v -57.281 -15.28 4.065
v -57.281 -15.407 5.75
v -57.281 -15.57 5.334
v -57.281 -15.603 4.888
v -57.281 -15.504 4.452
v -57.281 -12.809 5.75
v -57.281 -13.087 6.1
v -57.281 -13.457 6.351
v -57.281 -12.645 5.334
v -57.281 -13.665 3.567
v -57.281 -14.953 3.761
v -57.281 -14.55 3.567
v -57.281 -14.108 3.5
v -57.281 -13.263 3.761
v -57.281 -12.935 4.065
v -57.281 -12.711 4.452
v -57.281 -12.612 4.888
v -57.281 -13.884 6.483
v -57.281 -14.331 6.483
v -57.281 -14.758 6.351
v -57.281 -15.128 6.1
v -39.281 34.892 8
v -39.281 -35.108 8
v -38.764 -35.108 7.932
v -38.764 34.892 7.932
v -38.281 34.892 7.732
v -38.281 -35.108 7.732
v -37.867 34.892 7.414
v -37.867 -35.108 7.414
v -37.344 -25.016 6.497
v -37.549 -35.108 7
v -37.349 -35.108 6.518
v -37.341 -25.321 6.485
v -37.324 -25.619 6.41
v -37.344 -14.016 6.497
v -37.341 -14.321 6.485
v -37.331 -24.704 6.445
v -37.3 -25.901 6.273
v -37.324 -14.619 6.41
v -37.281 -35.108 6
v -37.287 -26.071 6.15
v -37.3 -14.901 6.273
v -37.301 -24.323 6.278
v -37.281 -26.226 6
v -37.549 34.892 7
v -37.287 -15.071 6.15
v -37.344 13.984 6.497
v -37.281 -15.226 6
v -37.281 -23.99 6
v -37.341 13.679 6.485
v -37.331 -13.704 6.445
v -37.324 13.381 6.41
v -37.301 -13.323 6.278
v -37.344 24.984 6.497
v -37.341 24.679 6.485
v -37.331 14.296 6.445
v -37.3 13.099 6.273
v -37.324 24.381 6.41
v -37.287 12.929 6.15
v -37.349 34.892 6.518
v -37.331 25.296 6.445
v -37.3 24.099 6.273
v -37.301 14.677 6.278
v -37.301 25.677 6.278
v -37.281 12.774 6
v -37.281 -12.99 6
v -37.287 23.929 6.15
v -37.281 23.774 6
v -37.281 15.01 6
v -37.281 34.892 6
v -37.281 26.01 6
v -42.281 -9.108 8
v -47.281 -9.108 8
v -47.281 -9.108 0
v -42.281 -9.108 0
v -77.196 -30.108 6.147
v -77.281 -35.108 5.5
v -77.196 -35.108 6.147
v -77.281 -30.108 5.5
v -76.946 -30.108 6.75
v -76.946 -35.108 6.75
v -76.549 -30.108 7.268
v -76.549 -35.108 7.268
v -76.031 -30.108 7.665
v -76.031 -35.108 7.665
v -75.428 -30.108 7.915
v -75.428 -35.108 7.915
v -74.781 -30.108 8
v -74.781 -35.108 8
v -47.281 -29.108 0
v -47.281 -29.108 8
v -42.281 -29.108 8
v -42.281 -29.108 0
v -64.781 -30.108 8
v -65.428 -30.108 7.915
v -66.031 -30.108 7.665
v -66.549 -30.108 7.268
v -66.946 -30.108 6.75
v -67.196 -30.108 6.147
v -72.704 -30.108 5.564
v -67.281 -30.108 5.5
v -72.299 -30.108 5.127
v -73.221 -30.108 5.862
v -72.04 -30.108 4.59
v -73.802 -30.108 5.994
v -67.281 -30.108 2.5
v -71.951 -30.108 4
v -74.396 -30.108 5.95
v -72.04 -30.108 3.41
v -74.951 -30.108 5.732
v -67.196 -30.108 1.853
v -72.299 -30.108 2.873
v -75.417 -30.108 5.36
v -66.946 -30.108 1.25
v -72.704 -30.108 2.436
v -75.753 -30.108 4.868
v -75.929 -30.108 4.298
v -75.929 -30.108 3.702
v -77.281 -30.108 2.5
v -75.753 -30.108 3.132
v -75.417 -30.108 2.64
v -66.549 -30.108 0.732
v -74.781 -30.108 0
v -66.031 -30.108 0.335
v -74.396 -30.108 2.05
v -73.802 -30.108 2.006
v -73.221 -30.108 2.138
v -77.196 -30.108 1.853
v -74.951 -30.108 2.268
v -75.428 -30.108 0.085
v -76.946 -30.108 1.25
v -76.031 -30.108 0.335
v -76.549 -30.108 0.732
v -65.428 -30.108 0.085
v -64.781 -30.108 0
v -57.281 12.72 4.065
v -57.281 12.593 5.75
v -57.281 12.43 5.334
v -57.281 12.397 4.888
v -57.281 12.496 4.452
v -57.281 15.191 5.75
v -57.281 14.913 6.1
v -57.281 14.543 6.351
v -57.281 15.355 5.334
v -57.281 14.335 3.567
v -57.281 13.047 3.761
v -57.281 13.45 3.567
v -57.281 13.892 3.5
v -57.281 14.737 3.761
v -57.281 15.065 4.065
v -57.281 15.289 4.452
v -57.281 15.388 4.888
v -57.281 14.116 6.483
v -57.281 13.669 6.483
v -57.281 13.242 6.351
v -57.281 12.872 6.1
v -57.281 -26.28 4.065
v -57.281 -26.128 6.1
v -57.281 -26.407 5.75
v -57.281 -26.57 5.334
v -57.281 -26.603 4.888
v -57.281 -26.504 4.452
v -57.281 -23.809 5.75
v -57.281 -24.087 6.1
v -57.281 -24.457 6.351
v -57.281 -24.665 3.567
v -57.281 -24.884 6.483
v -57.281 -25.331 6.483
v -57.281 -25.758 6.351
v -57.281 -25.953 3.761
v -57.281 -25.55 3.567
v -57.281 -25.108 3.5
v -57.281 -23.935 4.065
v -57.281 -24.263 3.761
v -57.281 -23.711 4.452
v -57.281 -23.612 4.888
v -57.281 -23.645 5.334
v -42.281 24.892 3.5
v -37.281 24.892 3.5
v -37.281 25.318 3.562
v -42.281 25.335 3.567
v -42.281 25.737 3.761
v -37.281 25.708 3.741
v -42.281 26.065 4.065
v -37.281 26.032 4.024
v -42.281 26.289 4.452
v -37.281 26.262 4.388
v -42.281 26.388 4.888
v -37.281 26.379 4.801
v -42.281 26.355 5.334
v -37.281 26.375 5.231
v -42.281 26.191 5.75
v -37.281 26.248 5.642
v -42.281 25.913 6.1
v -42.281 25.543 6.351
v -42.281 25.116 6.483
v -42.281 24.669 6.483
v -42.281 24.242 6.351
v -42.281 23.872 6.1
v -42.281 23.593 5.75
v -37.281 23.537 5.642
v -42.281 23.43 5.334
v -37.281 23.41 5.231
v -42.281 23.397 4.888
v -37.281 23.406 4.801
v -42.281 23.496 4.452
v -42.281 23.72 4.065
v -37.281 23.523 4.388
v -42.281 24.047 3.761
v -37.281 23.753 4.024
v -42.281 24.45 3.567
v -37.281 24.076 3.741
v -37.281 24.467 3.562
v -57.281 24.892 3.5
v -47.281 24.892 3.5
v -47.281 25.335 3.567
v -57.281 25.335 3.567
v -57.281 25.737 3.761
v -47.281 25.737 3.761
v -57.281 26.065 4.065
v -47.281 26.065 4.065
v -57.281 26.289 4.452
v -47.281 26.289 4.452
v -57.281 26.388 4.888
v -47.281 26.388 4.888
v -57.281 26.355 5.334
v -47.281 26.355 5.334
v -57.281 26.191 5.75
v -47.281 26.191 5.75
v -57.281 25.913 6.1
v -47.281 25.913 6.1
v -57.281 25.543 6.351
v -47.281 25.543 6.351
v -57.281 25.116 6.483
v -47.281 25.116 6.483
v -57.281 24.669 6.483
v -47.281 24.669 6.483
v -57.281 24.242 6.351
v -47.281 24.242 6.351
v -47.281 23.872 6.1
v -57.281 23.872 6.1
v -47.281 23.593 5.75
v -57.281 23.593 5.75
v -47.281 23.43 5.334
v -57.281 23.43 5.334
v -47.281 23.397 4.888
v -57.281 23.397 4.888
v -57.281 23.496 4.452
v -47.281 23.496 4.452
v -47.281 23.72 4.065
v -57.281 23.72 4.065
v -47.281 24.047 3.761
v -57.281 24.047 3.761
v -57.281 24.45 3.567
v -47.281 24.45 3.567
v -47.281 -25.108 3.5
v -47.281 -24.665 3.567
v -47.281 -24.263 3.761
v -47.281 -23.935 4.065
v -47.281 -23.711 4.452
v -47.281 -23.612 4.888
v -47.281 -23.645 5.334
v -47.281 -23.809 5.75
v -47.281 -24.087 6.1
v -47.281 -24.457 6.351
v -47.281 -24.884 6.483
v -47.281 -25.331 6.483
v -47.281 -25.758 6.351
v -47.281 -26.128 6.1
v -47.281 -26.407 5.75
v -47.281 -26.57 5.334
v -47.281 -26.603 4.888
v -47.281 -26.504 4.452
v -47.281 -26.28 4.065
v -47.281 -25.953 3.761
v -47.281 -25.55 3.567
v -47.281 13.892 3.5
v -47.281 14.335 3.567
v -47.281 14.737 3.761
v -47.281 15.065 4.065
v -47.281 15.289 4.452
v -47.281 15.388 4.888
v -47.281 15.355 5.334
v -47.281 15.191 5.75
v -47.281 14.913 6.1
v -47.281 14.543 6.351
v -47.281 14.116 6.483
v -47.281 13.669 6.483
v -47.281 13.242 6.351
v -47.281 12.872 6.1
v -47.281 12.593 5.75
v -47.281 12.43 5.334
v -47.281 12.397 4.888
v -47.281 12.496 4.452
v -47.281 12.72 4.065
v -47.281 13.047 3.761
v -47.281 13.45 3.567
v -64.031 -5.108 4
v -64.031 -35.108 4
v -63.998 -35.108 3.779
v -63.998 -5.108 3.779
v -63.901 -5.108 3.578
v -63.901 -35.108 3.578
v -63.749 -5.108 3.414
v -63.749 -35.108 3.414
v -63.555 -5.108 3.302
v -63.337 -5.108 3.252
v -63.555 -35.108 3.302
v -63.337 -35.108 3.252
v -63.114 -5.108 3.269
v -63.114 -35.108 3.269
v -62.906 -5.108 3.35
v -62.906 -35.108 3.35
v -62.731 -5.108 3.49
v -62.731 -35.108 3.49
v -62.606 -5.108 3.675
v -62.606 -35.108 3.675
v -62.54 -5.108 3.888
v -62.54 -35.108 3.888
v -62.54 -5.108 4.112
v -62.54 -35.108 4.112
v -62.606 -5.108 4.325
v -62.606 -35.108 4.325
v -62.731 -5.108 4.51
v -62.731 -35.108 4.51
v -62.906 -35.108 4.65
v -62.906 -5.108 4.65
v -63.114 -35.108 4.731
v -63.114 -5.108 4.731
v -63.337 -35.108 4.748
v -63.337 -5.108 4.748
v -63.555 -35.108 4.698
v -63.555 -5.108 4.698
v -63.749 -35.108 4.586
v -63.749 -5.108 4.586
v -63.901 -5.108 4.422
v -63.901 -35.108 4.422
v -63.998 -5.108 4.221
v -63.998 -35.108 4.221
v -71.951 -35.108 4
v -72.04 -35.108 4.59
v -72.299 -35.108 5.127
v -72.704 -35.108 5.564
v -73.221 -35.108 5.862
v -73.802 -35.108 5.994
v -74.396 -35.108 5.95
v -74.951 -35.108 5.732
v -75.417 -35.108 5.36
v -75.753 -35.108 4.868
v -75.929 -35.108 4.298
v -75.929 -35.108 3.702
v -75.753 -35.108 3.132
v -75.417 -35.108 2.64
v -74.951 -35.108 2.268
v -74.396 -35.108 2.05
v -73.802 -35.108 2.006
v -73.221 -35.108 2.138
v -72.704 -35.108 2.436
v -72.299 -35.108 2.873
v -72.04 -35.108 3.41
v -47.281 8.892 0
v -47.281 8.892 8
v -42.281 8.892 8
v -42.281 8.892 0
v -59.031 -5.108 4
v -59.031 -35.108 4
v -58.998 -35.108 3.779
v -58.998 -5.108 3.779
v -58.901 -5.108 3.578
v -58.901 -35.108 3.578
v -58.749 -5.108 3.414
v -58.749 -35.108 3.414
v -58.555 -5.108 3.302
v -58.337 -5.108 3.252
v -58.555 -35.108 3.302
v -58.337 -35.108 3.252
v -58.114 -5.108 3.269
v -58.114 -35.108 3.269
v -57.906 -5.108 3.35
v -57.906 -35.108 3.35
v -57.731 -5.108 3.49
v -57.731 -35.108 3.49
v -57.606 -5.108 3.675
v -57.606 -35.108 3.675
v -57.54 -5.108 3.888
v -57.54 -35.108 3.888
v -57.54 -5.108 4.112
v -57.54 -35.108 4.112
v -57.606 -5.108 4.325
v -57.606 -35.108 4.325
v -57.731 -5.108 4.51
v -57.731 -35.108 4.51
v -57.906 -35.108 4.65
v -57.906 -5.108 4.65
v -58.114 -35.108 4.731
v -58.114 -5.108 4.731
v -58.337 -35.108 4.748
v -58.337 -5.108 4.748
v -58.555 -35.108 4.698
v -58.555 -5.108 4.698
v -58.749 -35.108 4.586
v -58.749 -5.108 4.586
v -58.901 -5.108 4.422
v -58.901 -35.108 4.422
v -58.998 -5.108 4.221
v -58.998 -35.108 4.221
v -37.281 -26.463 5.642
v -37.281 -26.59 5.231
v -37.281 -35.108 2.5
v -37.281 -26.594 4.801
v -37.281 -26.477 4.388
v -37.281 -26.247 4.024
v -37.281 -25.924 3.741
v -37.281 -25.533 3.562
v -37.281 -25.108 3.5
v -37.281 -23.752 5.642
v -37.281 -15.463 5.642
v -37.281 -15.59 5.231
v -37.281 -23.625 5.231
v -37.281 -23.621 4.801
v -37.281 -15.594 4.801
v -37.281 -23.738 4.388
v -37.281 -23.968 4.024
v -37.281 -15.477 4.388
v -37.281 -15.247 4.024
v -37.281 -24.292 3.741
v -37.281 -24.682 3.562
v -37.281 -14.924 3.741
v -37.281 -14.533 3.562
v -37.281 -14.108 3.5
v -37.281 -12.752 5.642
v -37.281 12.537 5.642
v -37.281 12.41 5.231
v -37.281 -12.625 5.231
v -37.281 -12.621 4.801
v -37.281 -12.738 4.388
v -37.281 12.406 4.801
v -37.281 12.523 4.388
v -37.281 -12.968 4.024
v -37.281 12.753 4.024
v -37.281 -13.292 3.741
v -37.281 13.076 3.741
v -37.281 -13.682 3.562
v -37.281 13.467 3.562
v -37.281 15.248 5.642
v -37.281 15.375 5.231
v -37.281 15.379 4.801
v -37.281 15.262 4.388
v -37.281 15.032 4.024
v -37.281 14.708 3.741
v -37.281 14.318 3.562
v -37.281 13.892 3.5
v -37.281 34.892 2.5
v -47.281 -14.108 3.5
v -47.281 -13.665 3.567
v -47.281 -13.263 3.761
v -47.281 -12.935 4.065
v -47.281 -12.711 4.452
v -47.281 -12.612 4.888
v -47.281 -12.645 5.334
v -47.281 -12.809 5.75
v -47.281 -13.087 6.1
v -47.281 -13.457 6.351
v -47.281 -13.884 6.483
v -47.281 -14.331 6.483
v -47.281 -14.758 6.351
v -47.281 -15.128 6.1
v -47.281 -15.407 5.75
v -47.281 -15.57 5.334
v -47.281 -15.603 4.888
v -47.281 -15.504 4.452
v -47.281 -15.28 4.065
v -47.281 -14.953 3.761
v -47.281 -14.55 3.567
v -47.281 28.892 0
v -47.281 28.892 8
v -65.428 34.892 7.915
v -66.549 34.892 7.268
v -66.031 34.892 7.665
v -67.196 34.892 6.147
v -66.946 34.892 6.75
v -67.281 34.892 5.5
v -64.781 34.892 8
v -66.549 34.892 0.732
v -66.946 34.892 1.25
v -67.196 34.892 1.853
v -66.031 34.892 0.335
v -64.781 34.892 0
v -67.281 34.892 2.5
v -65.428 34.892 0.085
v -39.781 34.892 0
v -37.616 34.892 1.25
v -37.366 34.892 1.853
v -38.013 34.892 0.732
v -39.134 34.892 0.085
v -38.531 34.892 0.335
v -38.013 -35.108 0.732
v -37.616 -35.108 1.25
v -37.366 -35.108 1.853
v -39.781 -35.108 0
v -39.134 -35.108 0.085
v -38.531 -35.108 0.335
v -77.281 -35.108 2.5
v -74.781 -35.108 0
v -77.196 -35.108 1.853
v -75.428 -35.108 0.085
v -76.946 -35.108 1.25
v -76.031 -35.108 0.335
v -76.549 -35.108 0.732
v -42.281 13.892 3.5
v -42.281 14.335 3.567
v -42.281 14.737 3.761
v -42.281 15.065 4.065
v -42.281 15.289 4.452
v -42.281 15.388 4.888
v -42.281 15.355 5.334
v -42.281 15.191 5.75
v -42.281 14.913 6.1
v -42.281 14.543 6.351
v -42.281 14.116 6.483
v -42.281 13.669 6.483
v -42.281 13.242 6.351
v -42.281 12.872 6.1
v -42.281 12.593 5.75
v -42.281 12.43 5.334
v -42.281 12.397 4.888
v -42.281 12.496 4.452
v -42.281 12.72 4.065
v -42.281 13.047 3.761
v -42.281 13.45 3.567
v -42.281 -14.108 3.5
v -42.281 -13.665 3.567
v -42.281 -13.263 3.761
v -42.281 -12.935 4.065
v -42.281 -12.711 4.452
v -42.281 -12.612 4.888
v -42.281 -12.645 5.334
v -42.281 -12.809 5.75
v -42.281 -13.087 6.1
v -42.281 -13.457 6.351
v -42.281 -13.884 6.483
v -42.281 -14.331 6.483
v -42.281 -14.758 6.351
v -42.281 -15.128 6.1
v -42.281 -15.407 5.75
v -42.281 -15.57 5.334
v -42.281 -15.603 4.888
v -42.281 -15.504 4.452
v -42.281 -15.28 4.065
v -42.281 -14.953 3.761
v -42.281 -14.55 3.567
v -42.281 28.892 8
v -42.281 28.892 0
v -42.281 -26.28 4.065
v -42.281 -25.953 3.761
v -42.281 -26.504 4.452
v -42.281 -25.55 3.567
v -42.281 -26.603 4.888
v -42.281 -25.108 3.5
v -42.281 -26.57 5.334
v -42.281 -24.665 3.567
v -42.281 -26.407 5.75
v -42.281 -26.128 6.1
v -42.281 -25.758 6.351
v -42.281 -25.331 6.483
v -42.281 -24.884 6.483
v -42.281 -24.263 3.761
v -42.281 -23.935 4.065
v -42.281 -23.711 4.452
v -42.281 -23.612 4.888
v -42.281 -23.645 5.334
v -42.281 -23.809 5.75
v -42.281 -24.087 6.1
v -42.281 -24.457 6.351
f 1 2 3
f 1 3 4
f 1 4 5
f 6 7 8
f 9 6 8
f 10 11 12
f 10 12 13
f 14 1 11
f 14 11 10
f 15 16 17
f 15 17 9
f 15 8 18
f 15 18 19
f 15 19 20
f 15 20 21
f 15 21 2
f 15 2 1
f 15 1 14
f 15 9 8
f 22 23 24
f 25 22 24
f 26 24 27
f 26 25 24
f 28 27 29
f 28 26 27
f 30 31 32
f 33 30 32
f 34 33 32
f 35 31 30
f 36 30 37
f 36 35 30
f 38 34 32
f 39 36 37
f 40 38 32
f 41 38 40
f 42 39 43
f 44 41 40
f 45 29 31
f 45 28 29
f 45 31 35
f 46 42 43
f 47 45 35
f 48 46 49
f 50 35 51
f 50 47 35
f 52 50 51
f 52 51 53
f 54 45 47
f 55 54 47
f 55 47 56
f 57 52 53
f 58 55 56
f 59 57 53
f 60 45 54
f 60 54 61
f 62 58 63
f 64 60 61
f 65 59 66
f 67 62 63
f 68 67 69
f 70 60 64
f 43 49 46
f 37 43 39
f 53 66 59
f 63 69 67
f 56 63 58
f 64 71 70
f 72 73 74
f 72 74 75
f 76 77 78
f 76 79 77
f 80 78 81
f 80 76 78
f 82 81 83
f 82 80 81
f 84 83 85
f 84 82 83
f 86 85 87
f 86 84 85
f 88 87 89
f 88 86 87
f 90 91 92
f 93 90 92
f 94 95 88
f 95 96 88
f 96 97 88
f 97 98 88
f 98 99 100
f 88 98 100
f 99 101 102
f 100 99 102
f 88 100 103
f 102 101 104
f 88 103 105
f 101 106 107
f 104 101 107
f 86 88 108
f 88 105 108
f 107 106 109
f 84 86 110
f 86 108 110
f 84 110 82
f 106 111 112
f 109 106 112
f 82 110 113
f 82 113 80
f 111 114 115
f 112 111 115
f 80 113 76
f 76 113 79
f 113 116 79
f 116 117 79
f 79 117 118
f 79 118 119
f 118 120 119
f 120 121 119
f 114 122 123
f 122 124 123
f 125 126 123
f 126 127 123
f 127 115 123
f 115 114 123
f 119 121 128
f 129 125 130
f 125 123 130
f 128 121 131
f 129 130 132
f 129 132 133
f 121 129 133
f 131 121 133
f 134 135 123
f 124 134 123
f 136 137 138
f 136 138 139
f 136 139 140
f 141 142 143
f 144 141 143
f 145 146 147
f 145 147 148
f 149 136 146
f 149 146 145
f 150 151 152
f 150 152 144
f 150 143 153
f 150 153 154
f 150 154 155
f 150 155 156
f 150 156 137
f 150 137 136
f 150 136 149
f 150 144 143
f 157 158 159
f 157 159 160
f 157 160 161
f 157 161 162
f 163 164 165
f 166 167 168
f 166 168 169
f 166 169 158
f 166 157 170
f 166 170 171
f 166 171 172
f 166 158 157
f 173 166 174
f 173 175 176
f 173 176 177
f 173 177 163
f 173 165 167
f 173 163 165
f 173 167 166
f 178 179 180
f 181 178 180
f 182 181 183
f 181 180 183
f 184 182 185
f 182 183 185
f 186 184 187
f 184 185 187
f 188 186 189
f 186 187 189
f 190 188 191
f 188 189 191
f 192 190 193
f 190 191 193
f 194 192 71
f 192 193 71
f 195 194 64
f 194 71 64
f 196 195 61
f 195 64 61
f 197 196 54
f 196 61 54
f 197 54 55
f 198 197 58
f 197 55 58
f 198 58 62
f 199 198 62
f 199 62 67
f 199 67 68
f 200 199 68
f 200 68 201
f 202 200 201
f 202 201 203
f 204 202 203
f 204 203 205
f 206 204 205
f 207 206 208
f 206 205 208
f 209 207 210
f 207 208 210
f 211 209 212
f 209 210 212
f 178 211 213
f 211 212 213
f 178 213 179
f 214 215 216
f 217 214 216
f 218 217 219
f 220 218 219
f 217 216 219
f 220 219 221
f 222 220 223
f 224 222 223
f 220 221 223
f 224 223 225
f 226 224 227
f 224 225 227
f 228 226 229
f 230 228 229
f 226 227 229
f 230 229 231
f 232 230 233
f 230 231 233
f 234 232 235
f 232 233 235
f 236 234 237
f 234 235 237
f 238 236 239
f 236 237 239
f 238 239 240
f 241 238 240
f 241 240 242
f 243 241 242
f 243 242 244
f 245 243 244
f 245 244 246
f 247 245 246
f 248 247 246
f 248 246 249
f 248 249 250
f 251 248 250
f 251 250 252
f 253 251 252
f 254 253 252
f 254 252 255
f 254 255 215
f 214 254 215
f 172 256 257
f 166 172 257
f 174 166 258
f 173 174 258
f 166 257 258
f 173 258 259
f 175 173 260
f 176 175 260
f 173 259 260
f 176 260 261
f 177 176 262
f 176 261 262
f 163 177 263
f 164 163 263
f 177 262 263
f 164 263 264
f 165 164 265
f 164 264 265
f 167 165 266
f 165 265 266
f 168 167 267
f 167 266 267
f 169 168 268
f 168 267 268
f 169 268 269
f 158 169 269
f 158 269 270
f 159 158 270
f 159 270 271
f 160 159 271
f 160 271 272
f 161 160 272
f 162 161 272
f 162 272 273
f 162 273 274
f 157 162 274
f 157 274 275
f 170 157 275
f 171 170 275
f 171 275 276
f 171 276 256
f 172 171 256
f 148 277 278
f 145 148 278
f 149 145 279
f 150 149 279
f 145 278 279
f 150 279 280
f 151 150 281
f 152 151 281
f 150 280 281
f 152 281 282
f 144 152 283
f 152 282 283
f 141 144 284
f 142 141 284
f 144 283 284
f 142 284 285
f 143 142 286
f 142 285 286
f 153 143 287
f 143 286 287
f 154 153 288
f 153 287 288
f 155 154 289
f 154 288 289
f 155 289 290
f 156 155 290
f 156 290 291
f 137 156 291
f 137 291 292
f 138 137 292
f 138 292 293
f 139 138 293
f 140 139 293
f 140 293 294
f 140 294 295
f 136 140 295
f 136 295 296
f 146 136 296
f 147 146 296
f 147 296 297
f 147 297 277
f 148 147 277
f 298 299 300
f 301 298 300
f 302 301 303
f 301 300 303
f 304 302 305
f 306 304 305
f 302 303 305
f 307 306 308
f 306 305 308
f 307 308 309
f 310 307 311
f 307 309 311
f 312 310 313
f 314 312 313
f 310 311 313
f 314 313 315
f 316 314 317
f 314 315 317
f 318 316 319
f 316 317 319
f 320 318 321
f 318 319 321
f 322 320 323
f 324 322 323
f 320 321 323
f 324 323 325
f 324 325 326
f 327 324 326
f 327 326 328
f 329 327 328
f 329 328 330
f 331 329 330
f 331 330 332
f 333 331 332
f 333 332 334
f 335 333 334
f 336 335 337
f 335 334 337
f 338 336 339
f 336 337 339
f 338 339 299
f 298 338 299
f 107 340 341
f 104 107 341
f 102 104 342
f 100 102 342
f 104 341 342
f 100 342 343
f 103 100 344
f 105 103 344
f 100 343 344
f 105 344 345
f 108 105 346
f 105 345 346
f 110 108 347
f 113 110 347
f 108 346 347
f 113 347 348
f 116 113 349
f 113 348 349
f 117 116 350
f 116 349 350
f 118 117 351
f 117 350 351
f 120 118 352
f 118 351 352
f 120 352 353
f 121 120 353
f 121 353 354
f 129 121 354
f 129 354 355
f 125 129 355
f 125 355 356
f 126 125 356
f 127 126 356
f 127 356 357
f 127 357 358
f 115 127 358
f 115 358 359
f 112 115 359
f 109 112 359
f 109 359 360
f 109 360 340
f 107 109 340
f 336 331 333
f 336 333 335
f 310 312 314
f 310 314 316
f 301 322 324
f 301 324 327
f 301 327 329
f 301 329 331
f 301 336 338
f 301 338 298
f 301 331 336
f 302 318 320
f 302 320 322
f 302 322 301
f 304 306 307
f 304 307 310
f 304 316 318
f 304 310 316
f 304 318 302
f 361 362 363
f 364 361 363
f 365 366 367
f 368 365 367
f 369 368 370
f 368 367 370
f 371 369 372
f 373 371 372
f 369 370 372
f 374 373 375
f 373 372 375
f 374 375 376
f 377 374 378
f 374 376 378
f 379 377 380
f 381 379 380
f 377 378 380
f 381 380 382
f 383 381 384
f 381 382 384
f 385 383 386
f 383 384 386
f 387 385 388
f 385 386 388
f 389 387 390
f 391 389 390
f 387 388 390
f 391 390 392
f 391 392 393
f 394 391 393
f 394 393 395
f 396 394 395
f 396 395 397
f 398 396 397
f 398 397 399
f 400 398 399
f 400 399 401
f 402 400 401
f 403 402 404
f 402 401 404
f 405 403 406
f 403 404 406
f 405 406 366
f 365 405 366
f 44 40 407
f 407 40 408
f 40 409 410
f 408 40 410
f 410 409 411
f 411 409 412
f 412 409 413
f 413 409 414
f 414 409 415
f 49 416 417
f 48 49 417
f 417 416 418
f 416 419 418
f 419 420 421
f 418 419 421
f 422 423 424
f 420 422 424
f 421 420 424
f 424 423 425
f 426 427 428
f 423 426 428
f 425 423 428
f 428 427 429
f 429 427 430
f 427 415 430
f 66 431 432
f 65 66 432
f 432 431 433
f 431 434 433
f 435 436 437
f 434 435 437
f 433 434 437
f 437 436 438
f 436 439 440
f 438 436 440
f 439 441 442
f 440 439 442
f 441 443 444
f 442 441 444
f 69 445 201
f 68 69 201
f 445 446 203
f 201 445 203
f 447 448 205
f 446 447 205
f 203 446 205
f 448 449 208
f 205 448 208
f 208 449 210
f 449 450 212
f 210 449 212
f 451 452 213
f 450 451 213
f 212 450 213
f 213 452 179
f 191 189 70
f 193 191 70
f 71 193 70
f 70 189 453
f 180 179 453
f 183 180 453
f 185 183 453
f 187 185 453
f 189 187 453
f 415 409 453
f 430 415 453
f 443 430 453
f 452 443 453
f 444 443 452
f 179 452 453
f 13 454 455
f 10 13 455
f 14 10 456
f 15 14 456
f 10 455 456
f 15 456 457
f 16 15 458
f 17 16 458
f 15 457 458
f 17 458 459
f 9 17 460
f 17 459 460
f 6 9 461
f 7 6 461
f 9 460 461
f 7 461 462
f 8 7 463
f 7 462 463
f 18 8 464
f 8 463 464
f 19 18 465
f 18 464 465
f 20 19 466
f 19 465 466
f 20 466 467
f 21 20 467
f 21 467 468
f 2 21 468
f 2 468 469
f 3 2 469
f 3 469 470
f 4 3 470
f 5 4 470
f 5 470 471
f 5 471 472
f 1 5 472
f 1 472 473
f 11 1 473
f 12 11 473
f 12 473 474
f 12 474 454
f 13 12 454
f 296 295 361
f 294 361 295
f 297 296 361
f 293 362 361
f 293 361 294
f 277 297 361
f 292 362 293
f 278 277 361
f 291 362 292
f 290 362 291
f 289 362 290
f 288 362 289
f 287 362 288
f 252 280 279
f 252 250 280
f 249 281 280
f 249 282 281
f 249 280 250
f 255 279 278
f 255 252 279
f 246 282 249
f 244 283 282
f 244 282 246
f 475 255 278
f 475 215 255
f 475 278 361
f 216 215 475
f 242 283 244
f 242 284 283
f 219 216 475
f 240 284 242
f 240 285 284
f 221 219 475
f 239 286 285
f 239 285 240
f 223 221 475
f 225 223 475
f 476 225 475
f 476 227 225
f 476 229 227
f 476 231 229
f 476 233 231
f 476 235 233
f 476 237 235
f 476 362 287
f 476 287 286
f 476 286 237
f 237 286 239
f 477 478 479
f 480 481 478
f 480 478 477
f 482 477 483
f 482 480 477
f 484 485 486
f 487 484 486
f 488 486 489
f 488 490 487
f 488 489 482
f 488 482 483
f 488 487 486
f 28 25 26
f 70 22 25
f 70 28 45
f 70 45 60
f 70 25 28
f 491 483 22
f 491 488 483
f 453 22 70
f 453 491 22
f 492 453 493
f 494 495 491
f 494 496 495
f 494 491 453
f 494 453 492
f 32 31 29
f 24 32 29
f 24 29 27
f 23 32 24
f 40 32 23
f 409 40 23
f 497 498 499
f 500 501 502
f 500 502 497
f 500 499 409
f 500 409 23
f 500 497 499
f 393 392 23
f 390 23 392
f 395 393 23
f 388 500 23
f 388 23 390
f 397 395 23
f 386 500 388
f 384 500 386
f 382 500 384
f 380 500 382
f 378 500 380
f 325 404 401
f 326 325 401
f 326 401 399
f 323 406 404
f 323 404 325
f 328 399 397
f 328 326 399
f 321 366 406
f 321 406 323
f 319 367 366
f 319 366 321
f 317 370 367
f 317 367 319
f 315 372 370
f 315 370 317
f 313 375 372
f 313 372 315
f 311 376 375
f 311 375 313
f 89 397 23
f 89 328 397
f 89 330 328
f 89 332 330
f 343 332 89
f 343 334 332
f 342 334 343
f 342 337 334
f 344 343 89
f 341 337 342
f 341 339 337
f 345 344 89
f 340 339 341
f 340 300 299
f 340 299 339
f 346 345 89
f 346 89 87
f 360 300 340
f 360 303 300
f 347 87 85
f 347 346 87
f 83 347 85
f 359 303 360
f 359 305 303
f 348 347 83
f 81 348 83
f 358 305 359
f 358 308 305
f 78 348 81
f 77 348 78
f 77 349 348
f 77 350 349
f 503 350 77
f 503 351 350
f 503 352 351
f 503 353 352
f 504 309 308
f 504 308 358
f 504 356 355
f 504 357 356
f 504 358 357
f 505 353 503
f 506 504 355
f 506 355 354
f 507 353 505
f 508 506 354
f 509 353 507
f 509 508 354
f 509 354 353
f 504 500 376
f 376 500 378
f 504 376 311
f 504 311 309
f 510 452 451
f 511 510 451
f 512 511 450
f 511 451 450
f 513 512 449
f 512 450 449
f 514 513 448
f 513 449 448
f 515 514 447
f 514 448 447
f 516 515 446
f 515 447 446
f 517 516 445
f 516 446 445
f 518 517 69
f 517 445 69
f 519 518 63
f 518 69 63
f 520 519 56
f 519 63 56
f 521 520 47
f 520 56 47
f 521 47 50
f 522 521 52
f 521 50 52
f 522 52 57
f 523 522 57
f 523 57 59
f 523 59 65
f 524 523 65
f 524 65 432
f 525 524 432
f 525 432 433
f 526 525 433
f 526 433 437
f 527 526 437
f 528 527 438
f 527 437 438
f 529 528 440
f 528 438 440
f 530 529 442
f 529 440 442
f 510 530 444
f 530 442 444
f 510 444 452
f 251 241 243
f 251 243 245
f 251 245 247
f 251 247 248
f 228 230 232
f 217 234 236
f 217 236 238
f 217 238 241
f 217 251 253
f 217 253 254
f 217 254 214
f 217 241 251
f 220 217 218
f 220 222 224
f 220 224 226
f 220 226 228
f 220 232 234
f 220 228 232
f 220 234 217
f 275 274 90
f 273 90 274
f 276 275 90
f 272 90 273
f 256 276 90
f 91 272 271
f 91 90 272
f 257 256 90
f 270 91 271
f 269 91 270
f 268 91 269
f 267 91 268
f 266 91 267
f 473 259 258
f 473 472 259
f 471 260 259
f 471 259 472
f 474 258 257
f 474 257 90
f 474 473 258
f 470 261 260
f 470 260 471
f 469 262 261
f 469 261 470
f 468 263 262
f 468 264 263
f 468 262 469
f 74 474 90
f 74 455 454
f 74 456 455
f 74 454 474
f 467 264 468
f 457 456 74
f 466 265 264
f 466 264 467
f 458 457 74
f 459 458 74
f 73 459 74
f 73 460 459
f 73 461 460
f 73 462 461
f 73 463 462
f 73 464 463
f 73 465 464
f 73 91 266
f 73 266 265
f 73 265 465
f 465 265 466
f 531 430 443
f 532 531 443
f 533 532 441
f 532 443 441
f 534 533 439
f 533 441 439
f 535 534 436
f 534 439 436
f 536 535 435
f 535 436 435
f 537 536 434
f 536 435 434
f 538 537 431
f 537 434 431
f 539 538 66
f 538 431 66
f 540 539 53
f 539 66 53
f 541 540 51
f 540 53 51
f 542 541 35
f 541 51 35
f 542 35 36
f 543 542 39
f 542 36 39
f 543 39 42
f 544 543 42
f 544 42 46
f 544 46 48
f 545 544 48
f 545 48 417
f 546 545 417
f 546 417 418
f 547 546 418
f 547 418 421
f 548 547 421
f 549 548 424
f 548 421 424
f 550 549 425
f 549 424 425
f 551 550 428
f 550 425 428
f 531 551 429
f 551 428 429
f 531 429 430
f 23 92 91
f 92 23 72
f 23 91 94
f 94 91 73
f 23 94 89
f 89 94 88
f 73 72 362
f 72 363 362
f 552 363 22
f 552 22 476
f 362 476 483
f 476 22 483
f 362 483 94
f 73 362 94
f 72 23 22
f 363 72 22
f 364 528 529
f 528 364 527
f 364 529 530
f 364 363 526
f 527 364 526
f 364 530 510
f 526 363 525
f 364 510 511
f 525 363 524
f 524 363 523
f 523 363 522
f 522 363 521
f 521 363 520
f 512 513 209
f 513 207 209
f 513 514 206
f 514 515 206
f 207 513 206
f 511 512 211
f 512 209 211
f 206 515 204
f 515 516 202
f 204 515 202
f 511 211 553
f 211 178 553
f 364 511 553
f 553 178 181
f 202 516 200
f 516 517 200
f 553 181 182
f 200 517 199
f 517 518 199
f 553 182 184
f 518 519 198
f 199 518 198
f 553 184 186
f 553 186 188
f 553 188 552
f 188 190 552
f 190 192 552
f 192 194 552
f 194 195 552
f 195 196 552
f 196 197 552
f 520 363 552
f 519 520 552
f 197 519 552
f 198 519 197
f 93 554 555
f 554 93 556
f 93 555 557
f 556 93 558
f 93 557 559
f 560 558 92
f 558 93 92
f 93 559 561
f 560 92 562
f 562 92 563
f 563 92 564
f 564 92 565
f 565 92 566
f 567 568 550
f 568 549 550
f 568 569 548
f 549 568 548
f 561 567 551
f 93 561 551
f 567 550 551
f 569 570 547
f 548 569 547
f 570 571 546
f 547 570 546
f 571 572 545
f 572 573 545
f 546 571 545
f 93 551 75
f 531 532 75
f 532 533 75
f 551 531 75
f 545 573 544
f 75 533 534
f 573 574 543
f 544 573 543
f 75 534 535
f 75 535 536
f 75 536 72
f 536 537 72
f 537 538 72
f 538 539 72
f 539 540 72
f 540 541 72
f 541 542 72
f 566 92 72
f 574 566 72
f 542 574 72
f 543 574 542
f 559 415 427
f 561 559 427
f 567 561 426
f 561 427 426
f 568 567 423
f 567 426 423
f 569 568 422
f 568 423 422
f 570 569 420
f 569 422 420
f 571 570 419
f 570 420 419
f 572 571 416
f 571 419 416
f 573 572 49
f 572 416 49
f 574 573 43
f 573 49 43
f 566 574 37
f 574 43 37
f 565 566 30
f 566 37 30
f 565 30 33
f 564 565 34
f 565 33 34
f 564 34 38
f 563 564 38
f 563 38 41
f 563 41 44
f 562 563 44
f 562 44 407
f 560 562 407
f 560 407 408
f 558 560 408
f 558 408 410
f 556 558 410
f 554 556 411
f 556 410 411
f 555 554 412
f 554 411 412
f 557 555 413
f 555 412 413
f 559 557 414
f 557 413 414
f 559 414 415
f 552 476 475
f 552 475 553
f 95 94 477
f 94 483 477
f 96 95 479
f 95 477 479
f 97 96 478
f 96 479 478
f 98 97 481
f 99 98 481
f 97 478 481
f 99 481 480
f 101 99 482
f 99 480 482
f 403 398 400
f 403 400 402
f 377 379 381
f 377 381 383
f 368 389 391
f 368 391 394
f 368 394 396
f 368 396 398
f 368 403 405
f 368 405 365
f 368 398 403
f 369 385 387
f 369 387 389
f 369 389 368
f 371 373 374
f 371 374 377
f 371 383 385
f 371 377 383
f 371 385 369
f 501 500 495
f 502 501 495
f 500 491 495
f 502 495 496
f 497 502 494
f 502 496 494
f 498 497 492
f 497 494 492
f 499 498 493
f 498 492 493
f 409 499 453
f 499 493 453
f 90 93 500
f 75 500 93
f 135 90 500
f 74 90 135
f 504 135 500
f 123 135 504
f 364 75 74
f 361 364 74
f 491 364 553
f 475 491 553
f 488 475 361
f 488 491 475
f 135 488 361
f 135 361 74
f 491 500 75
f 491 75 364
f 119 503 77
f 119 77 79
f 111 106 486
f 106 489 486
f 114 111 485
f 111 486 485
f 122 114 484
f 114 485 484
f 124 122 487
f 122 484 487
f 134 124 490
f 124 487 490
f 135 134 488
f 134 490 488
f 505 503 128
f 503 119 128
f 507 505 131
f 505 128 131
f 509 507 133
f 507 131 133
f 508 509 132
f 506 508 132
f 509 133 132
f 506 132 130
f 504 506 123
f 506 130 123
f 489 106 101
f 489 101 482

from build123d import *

# Parameters (mm, degrees)
ESBO_O2_W                = 30
ESBO_O2_H                = 70
RESSALTO_EXTRUS_O1_DEPTH = 8
ESBO_O3_R                = 0.75
CORTE_EXTRUS_O1_DEPTH    = 30
FILETE1_R                = 2
ESBO_O17_W               = 10
ESBO_O17_H               = 5
RESSALTO_EXTRUS_O4_DEPTH = 8
ESBO_O20_R               = 2
CORTE_EXTRUS_O9_DEPTH    = 8
FILETE2_R                = 2.5
FILETE3_R                = 2.5
FILETE4_R                = 2.5
FILETE5_R                = 2.5
ESBO_O21_W               = 5
ESBO_O21_H               = 20
CORTE_EXTRUS_O10_DEPTH   = 9
FILETE6_R                = 2.5
ESBO_O22_R               = 1.5
CORTE_EXTRUS_O11_DEPTH   = 20


with BuildPart() as part:
    # Esboço2 → Ressalto-extrusão1 (new body)
    with BuildSketch(Plane.XY):
        with Locations((-52.281248797, -0.107598663)):
            Rectangle(ESBO_O2_W, ESBO_O2_H)
    extrude(amount=RESSALTO_EXTRUS_O1_DEPTH)

    # Esboço3 → Corte-extrusão1 (cut)
    with BuildSketch(Plane(origin=(0, -35.107598663, 0), x_dir=(-1, 0, 0), z_dir=(0, -1, 0))):
        with Locations((58.281248797, -4)):
            Circle(ESBO_O3_R)
        with Locations((63.281248797, -4)):
            Circle(ESBO_O3_R)
    extrude(amount=-CORTE_EXTRUS_O1_DEPTH, mode=Mode.SUBTRACT)

    # Filete1
    filete1_edges = [part.edges().sort_by_distance(p)[0] for p in [
        (-37.281248797, -0.107598663, 8),
    ]]
    fillet(filete1_edges, radius=FILETE1_R)

    # Esboço17 → Ressalto-extrusão4 (add)
    with BuildSketch(Plane(origin=(0, 0, 0), x_dir=(-1, 0, 0), z_dir=(0, 0, -1))):
        with Locations((72.281248797, -32.607598663)):
            Rectangle(ESBO_O17_W, ESBO_O17_H)
    extrude(amount=-RESSALTO_EXTRUS_O4_DEPTH)

    # Esboço20 → Corte-extrusão9 (cut)
    with BuildSketch(Plane.XZ.offset(35.107598663)):
        with Locations((-73.951248797, 4)):
            Circle(ESBO_O20_R)
    extrude(amount=-CORTE_EXTRUS_O9_DEPTH, mode=Mode.SUBTRACT)

    # Filete2
    filete2_edges = [part.edges().sort_by_distance(p)[0] for p in [
        (-67.281248797, 2.392401337, 8),
    ]]
    fillet(filete2_edges, radius=FILETE2_R)

    # Filete3
    filete3_edges = [part.edges().sort_by_distance(p)[0] for p in [
        (-67.281248797, 2.392401337, 0),
    ]]
    fillet(filete3_edges, radius=FILETE3_R)

    # Filete4
    filete4_edges = [part.edges().sort_by_distance(p)[0] for p in [
        (-77.281248797, -32.607598663, 8),
    ]]
    fillet(filete4_edges, radius=FILETE4_R)

    # Filete5
    filete5_edges = [part.edges().sort_by_distance(p)[0] for p in [
        (-77.281248797, -32.607598663, 0),
    ]]
    fillet(filete5_edges, radius=FILETE5_R)

    # Esboço21 → Corte-extrusão10 (cut, through all)
    with BuildSketch(Plane.XY.offset(8)):
        with Locations((-44.781248797, 18.892401337)):
            Rectangle(ESBO_O21_W, ESBO_O21_H)
        with Locations((-44.781248797, -19.107598663)):
            Rectangle(ESBO_O21_W, ESBO_O21_H)
    extrude(amount=-CORTE_EXTRUS_O10_DEPTH, mode=Mode.SUBTRACT)

    # Filete6
    filete6_edges = [part.edges().sort_by_distance(p)[0] for p in [
        (-37.281248797, -0.107598663, 0),
    ]]
    fillet(filete6_edges, radius=FILETE6_R)

    # Esboço22 → Corte-extrusão11 (cut)
    with BuildSketch(Plane(origin=(-37.281248797, 0, 0), x_dir=(0, 0, -1), z_dir=(1, 0, 0))):
        with Locations((-5, -25.107598663)):
            Circle(ESBO_O22_R)
        with Locations((-5, -14.107598663)):
            Circle(ESBO_O22_R)
        with Locations((-5, 24.892401337)):
            Circle(ESBO_O22_R)
        with Locations((-5, 13.892401337)):
            Circle(ESBO_O22_R)
    extrude(amount=-CORTE_EXTRUS_O11_DEPTH, mode=Mode.SUBTRACT)


solid = part.part
